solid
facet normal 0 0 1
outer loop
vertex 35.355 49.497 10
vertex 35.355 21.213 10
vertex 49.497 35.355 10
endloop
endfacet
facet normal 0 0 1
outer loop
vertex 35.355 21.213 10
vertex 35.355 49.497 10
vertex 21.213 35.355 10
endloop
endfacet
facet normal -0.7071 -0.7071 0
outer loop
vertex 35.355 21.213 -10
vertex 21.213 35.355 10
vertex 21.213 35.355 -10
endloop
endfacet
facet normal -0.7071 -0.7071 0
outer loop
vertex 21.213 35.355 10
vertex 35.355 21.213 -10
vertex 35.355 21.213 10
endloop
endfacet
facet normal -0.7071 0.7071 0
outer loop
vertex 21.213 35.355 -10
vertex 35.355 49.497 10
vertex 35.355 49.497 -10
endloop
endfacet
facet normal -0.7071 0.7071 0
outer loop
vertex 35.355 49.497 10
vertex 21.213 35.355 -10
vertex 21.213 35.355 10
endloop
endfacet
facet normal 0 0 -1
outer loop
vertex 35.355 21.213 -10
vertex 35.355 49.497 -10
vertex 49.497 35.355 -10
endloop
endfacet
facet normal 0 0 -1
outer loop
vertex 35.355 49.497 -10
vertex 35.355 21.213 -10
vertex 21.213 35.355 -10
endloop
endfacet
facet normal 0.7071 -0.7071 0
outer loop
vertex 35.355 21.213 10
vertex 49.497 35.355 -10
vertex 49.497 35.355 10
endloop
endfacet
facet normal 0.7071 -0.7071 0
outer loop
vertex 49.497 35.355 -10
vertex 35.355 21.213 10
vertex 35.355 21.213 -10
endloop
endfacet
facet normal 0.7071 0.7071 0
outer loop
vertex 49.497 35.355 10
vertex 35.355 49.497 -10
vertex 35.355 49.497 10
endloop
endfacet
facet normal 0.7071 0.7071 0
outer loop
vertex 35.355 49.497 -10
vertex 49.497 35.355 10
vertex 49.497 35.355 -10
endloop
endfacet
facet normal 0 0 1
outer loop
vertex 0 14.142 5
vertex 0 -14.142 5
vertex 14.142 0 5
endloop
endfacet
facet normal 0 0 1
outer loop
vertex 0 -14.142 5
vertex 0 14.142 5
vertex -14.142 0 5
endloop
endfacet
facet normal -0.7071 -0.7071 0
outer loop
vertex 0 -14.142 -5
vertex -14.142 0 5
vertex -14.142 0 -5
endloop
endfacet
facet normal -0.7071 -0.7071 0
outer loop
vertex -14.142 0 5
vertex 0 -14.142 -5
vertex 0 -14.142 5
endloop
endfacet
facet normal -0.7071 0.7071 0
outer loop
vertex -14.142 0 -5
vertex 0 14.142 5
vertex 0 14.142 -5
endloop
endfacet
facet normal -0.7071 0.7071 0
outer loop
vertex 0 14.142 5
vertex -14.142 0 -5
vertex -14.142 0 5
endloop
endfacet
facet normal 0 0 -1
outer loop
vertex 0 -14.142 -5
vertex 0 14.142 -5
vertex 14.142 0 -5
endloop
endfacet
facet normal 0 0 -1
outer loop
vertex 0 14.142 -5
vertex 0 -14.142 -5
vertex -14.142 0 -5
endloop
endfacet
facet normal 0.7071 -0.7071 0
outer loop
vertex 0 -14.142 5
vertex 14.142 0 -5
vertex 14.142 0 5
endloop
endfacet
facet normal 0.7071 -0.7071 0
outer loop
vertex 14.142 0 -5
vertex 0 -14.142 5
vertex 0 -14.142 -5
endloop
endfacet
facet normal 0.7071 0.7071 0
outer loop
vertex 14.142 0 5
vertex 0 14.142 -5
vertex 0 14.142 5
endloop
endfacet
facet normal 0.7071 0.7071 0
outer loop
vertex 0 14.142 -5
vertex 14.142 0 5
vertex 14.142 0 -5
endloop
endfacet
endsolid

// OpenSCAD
//-- Rota siempre con respecto al origen de los ejes, la translación igual siempre con respecto al origen de coordenadas (distancias en mm y angulos en º)

rotate([0,0,45])
  translate([50,0,0])
  cube([20,20,20],center=true);
  
rotate([0,0,45])
  cube([20,20,10], center = true);
